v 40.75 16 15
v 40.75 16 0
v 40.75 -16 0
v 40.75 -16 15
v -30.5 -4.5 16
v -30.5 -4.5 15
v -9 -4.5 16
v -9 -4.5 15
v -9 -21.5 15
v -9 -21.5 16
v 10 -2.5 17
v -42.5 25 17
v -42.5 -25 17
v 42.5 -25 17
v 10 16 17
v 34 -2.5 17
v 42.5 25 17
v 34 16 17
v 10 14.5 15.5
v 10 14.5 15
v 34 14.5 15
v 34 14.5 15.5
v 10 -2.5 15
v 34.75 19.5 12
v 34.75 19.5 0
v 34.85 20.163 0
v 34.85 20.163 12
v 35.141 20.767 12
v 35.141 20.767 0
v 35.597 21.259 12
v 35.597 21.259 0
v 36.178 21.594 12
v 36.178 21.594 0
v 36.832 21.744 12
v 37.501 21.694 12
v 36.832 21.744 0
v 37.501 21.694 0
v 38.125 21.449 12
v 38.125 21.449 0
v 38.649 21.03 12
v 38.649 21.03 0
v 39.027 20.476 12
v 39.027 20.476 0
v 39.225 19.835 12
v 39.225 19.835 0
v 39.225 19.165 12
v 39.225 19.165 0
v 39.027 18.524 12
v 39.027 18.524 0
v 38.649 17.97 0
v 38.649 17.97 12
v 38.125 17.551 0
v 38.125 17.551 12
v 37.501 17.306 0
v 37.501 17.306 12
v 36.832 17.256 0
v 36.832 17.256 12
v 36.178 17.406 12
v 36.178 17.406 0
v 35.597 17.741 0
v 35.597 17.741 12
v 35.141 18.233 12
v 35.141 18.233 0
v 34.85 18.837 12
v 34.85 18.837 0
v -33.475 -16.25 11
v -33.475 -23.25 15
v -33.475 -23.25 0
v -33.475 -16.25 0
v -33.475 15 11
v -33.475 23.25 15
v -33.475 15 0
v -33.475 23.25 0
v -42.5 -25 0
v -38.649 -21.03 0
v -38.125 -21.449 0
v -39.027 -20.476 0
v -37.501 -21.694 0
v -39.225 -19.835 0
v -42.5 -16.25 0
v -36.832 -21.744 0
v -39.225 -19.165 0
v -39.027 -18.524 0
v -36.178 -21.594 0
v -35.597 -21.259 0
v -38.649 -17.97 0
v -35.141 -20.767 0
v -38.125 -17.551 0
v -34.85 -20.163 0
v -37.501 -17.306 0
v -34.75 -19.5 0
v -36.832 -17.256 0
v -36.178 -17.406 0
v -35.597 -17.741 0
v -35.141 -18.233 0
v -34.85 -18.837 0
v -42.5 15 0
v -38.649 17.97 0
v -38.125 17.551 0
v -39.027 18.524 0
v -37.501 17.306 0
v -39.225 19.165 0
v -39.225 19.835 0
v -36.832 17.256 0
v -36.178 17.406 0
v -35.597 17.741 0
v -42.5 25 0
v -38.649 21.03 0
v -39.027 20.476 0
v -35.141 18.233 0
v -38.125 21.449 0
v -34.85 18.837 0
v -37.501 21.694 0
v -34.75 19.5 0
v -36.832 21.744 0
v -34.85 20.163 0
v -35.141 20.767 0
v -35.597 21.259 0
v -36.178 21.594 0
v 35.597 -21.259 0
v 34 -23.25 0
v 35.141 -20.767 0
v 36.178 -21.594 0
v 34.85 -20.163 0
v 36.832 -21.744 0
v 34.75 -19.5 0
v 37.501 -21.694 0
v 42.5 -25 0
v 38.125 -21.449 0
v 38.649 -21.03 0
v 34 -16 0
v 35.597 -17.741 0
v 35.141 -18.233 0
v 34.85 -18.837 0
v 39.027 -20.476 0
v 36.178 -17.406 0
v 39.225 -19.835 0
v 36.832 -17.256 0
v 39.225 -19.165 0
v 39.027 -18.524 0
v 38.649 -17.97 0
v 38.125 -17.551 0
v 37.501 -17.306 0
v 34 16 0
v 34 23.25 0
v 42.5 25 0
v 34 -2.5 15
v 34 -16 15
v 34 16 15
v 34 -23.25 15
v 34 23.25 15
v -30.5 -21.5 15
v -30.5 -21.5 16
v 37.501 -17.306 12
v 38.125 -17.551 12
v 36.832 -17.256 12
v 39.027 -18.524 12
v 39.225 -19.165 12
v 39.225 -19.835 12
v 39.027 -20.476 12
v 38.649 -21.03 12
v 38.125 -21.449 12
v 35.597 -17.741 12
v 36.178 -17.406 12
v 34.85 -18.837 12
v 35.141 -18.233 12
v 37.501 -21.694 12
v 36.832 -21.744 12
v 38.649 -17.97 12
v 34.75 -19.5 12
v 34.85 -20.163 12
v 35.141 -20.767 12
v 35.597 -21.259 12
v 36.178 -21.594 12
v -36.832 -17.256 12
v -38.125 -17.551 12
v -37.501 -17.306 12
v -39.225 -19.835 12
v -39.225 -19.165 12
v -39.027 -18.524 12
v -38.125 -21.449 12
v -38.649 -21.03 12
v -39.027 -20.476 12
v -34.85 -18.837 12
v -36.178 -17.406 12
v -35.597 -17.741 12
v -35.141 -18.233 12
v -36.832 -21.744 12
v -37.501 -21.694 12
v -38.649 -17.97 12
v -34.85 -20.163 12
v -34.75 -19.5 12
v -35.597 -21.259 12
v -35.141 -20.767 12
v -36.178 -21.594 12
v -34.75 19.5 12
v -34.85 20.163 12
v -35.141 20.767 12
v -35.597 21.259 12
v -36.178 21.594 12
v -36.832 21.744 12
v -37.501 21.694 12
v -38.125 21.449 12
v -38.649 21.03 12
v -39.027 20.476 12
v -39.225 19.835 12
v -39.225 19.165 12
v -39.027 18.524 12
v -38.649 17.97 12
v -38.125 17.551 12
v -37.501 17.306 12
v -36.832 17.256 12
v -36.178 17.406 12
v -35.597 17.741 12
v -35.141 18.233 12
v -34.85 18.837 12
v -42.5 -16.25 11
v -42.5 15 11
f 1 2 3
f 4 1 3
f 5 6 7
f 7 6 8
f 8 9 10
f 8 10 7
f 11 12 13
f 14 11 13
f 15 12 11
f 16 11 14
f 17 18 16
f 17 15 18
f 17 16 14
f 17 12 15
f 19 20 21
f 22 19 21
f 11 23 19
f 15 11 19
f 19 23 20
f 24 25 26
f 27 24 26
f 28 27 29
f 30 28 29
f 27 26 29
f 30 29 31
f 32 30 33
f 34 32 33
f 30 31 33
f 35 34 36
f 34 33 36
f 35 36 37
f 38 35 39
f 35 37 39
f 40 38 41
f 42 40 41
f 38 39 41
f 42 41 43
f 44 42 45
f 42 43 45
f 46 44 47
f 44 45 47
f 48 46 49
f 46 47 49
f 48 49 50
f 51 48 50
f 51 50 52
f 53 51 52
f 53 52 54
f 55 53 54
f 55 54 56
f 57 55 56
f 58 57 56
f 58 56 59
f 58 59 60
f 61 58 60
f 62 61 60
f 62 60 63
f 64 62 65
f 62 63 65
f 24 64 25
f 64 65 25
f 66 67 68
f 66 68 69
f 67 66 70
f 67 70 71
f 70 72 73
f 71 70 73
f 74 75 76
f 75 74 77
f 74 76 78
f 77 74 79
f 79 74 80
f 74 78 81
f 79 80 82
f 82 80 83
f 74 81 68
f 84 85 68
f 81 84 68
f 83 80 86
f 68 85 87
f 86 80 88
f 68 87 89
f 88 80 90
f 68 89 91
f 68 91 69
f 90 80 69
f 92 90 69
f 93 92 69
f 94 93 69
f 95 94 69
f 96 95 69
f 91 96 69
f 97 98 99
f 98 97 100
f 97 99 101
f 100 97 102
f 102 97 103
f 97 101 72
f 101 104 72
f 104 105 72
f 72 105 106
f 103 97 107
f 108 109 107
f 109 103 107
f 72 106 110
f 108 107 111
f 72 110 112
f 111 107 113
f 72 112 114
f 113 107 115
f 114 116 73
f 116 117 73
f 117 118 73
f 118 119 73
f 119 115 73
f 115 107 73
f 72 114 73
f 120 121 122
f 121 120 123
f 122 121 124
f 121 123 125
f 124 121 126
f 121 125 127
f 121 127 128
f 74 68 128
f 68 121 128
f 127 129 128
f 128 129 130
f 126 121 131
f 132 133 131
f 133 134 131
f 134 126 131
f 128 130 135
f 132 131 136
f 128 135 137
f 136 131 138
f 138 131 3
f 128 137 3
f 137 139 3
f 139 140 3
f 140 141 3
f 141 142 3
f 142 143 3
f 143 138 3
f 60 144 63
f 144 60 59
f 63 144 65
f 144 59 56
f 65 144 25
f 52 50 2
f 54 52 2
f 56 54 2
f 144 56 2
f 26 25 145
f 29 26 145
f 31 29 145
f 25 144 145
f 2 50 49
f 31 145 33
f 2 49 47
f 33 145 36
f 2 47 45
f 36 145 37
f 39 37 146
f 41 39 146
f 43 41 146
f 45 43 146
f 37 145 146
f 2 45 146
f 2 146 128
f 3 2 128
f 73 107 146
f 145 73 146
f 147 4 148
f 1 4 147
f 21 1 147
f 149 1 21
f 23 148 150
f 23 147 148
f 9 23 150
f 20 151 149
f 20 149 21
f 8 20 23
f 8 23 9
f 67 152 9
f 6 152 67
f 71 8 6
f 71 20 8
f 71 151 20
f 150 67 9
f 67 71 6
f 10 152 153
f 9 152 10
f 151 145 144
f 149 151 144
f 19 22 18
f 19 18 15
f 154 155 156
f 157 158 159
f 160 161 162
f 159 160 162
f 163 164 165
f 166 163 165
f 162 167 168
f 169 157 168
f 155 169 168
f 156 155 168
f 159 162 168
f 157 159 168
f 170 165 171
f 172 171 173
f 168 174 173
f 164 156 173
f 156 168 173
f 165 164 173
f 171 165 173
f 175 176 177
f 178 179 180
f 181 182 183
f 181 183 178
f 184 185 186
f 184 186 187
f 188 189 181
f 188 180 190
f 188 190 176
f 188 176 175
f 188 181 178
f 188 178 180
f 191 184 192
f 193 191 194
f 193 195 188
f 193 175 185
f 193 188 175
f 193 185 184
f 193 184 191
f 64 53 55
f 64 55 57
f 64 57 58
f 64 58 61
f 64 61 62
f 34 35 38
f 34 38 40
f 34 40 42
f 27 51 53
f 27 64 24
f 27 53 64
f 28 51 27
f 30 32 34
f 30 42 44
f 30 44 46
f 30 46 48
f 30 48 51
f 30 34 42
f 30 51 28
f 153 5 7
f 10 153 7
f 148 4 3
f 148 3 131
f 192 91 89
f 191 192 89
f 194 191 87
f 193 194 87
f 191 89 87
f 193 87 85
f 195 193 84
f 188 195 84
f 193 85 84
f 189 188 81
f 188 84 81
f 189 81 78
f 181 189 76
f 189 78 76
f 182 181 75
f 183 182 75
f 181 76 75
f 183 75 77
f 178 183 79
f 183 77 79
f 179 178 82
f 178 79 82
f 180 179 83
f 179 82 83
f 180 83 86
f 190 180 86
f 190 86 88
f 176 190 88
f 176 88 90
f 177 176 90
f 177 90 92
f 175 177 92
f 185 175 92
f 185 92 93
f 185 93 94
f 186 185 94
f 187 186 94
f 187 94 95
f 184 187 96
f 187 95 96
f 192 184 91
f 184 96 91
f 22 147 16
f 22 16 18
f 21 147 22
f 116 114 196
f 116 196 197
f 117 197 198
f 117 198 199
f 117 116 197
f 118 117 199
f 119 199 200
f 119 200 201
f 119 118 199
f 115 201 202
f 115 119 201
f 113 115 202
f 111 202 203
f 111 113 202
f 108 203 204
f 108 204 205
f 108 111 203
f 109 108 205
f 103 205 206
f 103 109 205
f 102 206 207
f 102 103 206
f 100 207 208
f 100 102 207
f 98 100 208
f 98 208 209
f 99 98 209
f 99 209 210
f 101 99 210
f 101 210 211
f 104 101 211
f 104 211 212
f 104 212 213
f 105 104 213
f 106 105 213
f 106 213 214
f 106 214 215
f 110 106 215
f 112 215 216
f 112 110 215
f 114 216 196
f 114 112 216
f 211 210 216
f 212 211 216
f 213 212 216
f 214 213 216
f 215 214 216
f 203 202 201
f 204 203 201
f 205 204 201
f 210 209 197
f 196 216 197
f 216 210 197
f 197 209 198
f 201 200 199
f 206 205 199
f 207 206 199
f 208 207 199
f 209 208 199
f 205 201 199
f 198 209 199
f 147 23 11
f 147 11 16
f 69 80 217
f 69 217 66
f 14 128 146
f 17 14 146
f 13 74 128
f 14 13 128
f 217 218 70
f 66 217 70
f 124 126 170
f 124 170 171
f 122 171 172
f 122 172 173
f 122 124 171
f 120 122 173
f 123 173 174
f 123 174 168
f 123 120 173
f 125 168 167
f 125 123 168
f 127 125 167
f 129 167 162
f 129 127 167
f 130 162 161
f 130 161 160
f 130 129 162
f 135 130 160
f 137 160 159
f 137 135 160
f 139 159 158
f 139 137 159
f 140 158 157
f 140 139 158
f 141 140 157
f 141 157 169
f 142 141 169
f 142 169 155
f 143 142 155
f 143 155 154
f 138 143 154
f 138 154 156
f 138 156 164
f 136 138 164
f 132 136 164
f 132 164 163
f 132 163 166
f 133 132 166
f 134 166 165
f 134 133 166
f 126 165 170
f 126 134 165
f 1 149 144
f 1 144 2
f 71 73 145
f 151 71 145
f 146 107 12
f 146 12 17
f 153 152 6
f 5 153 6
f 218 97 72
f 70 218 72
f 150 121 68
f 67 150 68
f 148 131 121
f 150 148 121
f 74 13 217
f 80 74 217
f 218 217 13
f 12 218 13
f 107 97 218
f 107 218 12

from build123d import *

# Parameters (mm, degrees)
SKETCH012_W                     = 85
SKETCH012_H                     = 50
PAD009_DEPTH                    = 17
SKETCH013_W                     = 14.870205
SKETCH013_H                     = 31.25
POCKET002_DEPTH                 = 11
POCKET003_DEPTH                 = 15
SKETCH018_W                     = 21.5
SKETCH018_H                     = 17
POCKET007_DEPTH                 = 16
CYLINDER002_R                   = 2.25
CYLINDER002_DEPTH               = 12
CYLINDER002_MIRRORED009_2_R     = 2.25
CYLINDER002_MIRRORED009_2_DEPTH = 12
SKETCH037_W                     = 24
SKETCH037_H                     = 17
POCKET014_DEPTH                 = 17.001
CHAMFER003_SIZE                 = 1.5


with BuildPart() as part:
    # Sketch012 → Pad009 (new body)
    with BuildSketch(Plane.XY):
        Rectangle(SKETCH012_W, SKETCH012_H)
    extrude(amount=PAD009_DEPTH)

    # Sketch013 → Pocket002 (cut)
    with BuildSketch(Plane.XY):
        with Locations((-39.027907, -0.625)):
            Rectangle(SKETCH013_W, SKETCH013_H)
    extrude(amount=POCKET002_DEPTH, mode=Mode.SUBTRACT)

    # Sketch014 → Pocket003 (cut)
    with BuildSketch(Plane.XY):
        Polygon((-33.474945, 23.25), (34, 23.25), (34, 16), (40.75, 16), (40.75, -16), (34, -16), (34, -23.25), (-33.474945, -23.25), align=None)
    extrude(amount=POCKET003_DEPTH, mode=Mode.SUBTRACT)

    # Sketch018 → Pocket007 (cut)
    with BuildSketch(Plane.XY):
        with Locations((-19.75, -13)):
            Rectangle(SKETCH018_W, SKETCH018_H)
    extrude(amount=POCKET007_DEPTH, mode=Mode.SUBTRACT)

    # Cylinder002 → Cylinder002 (cut)
    with BuildSketch(Plane(origin=(-37, 19.5, 0), x_dir=(1, 0, 0), z_dir=(0, 0, 1))):
        Circle(CYLINDER002_R)
    cylinder002 = extrude(amount=CYLINDER002_DEPTH, mode=Mode.SUBTRACT)

    # Cylinder002 Mirrored009 2 → Cylinder002 Mirrored009 2 (cut)
    with BuildSketch(Plane(origin=(37, 19.5, 0), x_dir=(-1, 0, 0), z_dir=(0, 0, -1))):
        Circle(CYLINDER002_MIRRORED009_2_R)
    cylinder002_mirrored009_2 = extrude(amount=-CYLINDER002_MIRRORED009_2_DEPTH, mode=Mode.SUBTRACT)

    # Mirrored010: Cylinder002, Cylinder002 Mirrored009 2 across XZ
    add(cylinder002.mirror(Plane.XZ), mode=Mode.SUBTRACT)
    add(cylinder002_mirrored009_2.mirror(Plane.XZ), mode=Mode.SUBTRACT)

    # Sketch037 → Pocket014 (cut, through all)
    with BuildSketch(Plane.XY):
        with Locations((22, 6)):
            Rectangle(SKETCH037_W, SKETCH037_H)
    extrude(amount=POCKET014_DEPTH, mode=Mode.SUBTRACT)

    # Chamfer003
    chamfer003_edges = [part.edges().sort_by_distance(p)[0] for p in [
        (22, 14.5, 17),
    ]]
    chamfer(chamfer003_edges, length=CHAMFER003_SIZE)


solid = part.part
